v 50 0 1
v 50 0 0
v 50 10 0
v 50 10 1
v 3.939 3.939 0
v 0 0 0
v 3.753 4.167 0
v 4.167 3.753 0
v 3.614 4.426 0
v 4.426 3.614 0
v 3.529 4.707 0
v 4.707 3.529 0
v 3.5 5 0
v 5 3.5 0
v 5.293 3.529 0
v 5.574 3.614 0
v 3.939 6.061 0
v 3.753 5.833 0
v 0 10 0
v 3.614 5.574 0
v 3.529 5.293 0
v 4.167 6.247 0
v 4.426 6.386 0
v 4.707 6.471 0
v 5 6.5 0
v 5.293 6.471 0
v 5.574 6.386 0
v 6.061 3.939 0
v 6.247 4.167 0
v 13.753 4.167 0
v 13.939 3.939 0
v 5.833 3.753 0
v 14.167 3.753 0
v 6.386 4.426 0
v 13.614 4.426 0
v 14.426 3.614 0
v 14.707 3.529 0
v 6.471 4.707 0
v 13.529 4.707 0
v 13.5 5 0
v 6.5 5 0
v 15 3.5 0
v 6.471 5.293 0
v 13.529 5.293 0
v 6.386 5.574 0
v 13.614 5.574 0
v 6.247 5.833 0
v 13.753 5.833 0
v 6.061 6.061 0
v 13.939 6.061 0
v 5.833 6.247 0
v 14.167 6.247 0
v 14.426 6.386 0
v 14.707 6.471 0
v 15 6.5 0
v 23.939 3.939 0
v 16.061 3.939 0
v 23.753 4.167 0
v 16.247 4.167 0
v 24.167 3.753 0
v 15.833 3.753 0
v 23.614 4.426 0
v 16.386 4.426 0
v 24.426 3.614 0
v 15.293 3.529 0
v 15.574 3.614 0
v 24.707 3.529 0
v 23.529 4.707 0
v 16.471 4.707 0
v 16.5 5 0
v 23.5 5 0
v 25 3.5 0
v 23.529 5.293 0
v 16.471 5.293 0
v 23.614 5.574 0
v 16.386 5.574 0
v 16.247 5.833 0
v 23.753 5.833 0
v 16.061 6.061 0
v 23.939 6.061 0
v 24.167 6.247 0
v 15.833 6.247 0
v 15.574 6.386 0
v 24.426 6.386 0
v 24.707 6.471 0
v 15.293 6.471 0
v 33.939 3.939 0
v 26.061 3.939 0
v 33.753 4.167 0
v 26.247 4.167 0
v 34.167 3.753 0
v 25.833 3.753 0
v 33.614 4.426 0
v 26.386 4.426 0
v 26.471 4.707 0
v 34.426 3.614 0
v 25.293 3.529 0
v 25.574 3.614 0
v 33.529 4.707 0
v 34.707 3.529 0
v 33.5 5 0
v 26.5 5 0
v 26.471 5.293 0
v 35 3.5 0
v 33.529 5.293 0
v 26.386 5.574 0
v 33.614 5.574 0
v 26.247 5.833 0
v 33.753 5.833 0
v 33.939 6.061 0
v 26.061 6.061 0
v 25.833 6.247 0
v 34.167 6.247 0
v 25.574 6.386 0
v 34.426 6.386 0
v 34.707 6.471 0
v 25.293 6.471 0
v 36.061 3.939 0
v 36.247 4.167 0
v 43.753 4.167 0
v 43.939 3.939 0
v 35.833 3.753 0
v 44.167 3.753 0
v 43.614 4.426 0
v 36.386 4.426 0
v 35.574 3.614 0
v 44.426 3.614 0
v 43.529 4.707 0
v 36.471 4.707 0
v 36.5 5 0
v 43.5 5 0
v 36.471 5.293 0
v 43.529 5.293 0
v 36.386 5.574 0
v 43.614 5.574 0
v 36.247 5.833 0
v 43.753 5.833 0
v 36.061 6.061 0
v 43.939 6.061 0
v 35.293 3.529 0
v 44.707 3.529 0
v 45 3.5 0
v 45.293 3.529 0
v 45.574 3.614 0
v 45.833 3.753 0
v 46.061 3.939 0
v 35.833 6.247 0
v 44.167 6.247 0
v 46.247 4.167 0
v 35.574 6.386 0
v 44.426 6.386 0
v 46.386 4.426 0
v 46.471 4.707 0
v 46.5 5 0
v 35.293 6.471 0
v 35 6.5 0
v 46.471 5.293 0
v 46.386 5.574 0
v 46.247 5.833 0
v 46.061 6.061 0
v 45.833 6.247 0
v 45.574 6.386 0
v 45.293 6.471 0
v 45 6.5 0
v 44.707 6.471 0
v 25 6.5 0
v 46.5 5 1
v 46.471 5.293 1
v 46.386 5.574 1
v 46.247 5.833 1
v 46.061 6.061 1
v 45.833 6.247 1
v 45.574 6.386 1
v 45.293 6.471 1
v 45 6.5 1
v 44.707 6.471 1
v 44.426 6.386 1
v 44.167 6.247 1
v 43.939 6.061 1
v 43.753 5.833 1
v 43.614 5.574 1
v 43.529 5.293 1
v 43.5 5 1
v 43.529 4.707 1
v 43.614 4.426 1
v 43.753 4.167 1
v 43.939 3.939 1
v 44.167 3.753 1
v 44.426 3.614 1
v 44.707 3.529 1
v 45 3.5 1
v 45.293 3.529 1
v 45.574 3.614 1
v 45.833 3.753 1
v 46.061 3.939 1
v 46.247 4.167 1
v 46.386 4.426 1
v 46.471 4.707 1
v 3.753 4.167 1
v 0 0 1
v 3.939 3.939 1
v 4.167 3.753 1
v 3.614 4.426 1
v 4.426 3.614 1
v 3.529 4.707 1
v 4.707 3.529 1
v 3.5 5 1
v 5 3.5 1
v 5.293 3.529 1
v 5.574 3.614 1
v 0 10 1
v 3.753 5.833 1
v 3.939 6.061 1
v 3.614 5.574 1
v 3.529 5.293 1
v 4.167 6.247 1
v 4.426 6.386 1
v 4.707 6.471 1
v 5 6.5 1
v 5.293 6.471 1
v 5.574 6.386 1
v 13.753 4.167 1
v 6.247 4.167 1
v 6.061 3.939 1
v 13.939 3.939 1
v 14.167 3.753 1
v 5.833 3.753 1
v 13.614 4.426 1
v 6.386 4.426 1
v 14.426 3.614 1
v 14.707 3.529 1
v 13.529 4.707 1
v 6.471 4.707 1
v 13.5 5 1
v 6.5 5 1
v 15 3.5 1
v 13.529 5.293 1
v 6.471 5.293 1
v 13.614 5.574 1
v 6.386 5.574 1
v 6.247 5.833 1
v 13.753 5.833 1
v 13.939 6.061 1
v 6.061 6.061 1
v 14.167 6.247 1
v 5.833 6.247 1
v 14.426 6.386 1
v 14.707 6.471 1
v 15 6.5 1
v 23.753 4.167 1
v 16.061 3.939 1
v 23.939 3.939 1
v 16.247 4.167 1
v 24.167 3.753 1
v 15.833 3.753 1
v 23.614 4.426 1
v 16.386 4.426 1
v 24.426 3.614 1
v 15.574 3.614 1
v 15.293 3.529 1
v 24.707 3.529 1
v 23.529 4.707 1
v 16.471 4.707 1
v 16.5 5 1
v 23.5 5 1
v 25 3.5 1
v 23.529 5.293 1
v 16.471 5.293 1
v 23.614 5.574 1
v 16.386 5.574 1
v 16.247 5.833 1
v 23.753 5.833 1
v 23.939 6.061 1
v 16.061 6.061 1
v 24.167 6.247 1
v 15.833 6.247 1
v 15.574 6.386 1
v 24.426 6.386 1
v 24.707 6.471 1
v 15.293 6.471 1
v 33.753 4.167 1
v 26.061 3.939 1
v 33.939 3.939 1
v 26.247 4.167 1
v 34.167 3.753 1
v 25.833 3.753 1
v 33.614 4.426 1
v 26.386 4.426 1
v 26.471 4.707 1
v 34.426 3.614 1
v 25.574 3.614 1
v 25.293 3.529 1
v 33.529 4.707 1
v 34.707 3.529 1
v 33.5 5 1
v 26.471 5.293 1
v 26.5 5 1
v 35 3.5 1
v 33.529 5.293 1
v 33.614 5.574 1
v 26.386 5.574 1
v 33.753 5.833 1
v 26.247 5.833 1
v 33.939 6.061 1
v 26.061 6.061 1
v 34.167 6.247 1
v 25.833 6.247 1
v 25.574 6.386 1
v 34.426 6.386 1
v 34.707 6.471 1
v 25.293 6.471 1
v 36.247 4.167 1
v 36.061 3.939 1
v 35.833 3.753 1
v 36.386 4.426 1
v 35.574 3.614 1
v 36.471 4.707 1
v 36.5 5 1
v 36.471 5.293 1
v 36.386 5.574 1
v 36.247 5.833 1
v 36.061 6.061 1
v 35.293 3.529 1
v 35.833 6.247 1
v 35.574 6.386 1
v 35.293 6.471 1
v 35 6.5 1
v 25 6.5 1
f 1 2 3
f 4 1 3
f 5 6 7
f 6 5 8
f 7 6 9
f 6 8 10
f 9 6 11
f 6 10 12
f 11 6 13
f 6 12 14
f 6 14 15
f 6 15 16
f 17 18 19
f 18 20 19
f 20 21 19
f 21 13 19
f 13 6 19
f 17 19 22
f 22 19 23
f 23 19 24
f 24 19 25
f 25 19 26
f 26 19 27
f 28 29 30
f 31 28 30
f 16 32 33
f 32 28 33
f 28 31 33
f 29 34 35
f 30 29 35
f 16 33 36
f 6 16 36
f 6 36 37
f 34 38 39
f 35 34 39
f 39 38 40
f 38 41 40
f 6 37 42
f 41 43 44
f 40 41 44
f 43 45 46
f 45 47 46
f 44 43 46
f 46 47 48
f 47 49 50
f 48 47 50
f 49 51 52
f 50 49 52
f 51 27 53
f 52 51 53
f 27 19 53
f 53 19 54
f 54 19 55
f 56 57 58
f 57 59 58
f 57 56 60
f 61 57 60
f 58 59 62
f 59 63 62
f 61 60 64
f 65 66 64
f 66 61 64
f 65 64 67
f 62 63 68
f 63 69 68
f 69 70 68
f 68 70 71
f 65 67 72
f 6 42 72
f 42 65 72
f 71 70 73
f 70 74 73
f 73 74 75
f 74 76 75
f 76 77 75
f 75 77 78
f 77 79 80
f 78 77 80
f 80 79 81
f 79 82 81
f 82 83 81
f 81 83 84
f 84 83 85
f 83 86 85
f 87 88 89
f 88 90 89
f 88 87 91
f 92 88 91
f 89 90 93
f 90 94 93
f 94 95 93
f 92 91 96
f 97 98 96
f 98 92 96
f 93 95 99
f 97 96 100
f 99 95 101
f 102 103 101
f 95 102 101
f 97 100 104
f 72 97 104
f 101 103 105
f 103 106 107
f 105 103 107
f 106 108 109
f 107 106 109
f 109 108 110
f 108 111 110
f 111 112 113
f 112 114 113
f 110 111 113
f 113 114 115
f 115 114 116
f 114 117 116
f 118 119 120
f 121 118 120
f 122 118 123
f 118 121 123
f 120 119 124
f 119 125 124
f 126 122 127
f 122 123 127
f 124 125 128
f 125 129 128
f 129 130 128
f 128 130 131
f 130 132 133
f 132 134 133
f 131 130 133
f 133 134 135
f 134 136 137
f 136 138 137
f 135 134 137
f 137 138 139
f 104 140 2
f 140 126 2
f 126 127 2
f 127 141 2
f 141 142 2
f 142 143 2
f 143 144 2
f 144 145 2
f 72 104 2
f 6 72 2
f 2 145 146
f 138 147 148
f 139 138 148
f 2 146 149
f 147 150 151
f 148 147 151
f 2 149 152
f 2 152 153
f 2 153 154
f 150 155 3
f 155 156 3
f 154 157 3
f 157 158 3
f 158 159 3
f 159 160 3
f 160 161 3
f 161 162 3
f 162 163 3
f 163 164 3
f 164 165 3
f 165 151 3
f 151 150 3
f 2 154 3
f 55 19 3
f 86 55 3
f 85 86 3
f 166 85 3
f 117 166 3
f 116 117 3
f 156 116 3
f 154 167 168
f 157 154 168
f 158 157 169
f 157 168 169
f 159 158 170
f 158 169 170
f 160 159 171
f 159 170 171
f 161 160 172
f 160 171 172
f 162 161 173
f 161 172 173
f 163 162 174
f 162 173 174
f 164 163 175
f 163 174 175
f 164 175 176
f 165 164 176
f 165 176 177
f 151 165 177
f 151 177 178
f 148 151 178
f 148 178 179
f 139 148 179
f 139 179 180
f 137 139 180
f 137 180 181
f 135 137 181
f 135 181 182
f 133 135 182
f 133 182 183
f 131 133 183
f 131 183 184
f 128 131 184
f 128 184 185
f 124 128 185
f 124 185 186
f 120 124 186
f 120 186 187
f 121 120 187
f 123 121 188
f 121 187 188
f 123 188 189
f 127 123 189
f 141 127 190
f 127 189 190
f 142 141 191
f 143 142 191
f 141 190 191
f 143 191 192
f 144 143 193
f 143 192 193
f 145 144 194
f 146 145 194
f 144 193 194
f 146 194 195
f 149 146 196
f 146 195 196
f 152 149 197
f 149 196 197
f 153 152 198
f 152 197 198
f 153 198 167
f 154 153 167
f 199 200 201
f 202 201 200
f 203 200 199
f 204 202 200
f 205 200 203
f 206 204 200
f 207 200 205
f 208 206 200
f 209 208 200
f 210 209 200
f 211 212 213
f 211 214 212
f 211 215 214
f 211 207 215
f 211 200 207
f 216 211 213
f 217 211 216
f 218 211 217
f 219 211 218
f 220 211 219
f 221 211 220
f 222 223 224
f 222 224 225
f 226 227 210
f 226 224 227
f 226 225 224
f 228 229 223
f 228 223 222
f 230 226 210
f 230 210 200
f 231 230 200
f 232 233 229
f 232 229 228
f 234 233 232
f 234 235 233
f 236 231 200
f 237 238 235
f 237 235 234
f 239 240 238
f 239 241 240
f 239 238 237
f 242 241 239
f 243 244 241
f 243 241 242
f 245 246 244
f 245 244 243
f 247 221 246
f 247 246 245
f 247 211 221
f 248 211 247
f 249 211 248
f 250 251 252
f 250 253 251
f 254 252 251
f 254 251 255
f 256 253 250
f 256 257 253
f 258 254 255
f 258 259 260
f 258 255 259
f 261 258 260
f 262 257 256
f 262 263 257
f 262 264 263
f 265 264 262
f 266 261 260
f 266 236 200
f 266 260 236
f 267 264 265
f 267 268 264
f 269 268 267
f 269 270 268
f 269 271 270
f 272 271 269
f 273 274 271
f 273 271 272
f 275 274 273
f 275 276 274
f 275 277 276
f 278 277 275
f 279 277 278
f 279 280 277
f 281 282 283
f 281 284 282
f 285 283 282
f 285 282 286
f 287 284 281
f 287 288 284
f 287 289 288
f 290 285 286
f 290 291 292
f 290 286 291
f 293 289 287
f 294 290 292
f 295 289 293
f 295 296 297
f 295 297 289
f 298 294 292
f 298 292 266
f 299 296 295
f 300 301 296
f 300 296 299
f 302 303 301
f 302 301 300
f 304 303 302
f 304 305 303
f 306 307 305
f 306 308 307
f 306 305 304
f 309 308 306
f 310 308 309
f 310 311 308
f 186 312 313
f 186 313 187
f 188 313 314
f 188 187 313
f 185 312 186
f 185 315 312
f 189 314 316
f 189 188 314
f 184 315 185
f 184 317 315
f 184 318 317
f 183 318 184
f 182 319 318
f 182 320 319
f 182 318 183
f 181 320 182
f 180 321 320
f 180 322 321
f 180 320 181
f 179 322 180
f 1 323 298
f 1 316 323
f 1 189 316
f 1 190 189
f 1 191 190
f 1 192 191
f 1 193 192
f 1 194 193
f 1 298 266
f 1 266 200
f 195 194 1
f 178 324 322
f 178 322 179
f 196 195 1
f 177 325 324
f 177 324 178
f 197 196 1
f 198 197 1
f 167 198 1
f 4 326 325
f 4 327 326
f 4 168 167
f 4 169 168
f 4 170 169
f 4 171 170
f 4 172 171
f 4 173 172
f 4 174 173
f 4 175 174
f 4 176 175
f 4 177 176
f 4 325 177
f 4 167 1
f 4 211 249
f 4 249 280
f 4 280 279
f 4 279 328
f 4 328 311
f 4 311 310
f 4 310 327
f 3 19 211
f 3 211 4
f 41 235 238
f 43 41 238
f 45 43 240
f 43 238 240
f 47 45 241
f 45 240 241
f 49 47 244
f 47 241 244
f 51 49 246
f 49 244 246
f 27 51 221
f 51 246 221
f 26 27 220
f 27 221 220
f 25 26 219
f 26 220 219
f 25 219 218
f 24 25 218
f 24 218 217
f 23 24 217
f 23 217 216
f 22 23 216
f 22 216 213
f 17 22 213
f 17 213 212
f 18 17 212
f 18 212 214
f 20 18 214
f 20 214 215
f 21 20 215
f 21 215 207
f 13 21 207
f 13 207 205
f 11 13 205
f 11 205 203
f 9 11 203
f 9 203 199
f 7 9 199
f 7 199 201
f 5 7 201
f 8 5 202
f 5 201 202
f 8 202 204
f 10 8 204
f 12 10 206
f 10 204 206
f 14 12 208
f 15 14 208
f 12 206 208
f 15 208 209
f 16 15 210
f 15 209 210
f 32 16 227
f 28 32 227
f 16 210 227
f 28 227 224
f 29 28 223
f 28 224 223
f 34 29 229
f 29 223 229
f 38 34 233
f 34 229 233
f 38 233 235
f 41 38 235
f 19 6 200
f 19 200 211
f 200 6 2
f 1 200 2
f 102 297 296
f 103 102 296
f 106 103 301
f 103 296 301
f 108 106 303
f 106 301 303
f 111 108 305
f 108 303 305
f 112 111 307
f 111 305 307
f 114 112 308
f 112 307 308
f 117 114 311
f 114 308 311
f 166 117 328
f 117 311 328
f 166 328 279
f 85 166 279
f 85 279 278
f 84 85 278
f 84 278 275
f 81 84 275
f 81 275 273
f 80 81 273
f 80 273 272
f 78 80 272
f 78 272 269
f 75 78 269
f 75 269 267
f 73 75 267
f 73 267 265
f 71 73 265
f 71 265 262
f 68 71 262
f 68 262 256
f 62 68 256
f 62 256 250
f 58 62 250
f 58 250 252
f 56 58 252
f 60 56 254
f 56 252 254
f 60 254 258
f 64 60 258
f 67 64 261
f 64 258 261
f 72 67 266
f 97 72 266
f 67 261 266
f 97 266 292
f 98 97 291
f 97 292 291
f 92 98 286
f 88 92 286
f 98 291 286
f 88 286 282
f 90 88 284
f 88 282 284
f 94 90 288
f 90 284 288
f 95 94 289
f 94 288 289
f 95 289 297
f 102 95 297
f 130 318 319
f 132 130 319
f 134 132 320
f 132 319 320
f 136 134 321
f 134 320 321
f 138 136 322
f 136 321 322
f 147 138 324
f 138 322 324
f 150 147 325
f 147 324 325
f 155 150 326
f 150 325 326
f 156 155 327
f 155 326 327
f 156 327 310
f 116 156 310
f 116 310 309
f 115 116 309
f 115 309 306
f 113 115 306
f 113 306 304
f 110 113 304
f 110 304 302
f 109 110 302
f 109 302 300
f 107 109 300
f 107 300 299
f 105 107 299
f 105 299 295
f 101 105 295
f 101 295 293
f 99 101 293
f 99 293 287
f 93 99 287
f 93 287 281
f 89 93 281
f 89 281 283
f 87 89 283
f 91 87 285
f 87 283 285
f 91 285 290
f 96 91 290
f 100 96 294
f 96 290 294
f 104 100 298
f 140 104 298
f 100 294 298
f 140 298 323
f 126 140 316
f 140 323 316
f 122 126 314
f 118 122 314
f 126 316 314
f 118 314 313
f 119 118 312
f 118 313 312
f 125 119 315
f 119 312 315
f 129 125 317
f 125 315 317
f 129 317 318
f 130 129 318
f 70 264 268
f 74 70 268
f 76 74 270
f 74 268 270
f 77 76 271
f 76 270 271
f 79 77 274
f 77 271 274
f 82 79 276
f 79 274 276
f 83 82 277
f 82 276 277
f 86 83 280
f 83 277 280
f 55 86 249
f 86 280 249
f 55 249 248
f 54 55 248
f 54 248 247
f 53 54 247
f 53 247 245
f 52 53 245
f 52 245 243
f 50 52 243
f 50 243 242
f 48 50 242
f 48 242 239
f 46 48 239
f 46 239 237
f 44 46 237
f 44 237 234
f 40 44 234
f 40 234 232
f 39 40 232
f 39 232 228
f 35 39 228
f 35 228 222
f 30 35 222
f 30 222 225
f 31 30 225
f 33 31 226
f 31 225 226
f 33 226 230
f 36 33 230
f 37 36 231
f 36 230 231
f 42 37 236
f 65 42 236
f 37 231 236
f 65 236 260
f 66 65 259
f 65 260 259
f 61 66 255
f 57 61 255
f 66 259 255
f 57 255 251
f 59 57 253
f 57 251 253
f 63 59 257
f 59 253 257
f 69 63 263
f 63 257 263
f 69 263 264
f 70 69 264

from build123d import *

# Parameters (mm, degrees)
ESQUISSE1_W           = 50
ESQUISSE1_H           = 10
MAIN_DEPTH            = 1
ESQUISSE2_R           = 1.5
HOLE_DEPTH            = 2
REPEATHOLERIGHT_COUNT = 3
REPEATHOLERIGHT_PITCH = 10
REPEATHOLELEFT_COUNT  = 3
REPEATHOLELEFT_PITCH  = 10


with BuildPart() as part:
    # Esquisse1 → Main (new body)
    with BuildSketch(Plane.XY):
        with Locations((25, 5)):
            Rectangle(ESQUISSE1_W, ESQUISSE1_H)
    extrude(amount=MAIN_DEPTH)

    # Esquisse2 → Hole (cut, through all)
    with BuildSketch(Plane.XY.offset(1)):
        with Locations((25, 5)):
            Circle(ESQUISSE2_R)
    hole = extrude(amount=-HOLE_DEPTH, mode=Mode.SUBTRACT)

    # RepeatHoleRight: Hole ×3
    with Locations(*[(i * REPEATHOLERIGHT_PITCH, 0, 0) for i in range(1, REPEATHOLERIGHT_COUNT)]):
        add(hole, mode=Mode.SUBTRACT)

    # RepeatHoleLeft: Hole ×3
    with Locations(*[(-i * REPEATHOLELEFT_PITCH, 0, 0) for i in range(1, REPEATHOLELEFT_COUNT)]):
        add(hole, mode=Mode.SUBTRACT)


solid = part.part
